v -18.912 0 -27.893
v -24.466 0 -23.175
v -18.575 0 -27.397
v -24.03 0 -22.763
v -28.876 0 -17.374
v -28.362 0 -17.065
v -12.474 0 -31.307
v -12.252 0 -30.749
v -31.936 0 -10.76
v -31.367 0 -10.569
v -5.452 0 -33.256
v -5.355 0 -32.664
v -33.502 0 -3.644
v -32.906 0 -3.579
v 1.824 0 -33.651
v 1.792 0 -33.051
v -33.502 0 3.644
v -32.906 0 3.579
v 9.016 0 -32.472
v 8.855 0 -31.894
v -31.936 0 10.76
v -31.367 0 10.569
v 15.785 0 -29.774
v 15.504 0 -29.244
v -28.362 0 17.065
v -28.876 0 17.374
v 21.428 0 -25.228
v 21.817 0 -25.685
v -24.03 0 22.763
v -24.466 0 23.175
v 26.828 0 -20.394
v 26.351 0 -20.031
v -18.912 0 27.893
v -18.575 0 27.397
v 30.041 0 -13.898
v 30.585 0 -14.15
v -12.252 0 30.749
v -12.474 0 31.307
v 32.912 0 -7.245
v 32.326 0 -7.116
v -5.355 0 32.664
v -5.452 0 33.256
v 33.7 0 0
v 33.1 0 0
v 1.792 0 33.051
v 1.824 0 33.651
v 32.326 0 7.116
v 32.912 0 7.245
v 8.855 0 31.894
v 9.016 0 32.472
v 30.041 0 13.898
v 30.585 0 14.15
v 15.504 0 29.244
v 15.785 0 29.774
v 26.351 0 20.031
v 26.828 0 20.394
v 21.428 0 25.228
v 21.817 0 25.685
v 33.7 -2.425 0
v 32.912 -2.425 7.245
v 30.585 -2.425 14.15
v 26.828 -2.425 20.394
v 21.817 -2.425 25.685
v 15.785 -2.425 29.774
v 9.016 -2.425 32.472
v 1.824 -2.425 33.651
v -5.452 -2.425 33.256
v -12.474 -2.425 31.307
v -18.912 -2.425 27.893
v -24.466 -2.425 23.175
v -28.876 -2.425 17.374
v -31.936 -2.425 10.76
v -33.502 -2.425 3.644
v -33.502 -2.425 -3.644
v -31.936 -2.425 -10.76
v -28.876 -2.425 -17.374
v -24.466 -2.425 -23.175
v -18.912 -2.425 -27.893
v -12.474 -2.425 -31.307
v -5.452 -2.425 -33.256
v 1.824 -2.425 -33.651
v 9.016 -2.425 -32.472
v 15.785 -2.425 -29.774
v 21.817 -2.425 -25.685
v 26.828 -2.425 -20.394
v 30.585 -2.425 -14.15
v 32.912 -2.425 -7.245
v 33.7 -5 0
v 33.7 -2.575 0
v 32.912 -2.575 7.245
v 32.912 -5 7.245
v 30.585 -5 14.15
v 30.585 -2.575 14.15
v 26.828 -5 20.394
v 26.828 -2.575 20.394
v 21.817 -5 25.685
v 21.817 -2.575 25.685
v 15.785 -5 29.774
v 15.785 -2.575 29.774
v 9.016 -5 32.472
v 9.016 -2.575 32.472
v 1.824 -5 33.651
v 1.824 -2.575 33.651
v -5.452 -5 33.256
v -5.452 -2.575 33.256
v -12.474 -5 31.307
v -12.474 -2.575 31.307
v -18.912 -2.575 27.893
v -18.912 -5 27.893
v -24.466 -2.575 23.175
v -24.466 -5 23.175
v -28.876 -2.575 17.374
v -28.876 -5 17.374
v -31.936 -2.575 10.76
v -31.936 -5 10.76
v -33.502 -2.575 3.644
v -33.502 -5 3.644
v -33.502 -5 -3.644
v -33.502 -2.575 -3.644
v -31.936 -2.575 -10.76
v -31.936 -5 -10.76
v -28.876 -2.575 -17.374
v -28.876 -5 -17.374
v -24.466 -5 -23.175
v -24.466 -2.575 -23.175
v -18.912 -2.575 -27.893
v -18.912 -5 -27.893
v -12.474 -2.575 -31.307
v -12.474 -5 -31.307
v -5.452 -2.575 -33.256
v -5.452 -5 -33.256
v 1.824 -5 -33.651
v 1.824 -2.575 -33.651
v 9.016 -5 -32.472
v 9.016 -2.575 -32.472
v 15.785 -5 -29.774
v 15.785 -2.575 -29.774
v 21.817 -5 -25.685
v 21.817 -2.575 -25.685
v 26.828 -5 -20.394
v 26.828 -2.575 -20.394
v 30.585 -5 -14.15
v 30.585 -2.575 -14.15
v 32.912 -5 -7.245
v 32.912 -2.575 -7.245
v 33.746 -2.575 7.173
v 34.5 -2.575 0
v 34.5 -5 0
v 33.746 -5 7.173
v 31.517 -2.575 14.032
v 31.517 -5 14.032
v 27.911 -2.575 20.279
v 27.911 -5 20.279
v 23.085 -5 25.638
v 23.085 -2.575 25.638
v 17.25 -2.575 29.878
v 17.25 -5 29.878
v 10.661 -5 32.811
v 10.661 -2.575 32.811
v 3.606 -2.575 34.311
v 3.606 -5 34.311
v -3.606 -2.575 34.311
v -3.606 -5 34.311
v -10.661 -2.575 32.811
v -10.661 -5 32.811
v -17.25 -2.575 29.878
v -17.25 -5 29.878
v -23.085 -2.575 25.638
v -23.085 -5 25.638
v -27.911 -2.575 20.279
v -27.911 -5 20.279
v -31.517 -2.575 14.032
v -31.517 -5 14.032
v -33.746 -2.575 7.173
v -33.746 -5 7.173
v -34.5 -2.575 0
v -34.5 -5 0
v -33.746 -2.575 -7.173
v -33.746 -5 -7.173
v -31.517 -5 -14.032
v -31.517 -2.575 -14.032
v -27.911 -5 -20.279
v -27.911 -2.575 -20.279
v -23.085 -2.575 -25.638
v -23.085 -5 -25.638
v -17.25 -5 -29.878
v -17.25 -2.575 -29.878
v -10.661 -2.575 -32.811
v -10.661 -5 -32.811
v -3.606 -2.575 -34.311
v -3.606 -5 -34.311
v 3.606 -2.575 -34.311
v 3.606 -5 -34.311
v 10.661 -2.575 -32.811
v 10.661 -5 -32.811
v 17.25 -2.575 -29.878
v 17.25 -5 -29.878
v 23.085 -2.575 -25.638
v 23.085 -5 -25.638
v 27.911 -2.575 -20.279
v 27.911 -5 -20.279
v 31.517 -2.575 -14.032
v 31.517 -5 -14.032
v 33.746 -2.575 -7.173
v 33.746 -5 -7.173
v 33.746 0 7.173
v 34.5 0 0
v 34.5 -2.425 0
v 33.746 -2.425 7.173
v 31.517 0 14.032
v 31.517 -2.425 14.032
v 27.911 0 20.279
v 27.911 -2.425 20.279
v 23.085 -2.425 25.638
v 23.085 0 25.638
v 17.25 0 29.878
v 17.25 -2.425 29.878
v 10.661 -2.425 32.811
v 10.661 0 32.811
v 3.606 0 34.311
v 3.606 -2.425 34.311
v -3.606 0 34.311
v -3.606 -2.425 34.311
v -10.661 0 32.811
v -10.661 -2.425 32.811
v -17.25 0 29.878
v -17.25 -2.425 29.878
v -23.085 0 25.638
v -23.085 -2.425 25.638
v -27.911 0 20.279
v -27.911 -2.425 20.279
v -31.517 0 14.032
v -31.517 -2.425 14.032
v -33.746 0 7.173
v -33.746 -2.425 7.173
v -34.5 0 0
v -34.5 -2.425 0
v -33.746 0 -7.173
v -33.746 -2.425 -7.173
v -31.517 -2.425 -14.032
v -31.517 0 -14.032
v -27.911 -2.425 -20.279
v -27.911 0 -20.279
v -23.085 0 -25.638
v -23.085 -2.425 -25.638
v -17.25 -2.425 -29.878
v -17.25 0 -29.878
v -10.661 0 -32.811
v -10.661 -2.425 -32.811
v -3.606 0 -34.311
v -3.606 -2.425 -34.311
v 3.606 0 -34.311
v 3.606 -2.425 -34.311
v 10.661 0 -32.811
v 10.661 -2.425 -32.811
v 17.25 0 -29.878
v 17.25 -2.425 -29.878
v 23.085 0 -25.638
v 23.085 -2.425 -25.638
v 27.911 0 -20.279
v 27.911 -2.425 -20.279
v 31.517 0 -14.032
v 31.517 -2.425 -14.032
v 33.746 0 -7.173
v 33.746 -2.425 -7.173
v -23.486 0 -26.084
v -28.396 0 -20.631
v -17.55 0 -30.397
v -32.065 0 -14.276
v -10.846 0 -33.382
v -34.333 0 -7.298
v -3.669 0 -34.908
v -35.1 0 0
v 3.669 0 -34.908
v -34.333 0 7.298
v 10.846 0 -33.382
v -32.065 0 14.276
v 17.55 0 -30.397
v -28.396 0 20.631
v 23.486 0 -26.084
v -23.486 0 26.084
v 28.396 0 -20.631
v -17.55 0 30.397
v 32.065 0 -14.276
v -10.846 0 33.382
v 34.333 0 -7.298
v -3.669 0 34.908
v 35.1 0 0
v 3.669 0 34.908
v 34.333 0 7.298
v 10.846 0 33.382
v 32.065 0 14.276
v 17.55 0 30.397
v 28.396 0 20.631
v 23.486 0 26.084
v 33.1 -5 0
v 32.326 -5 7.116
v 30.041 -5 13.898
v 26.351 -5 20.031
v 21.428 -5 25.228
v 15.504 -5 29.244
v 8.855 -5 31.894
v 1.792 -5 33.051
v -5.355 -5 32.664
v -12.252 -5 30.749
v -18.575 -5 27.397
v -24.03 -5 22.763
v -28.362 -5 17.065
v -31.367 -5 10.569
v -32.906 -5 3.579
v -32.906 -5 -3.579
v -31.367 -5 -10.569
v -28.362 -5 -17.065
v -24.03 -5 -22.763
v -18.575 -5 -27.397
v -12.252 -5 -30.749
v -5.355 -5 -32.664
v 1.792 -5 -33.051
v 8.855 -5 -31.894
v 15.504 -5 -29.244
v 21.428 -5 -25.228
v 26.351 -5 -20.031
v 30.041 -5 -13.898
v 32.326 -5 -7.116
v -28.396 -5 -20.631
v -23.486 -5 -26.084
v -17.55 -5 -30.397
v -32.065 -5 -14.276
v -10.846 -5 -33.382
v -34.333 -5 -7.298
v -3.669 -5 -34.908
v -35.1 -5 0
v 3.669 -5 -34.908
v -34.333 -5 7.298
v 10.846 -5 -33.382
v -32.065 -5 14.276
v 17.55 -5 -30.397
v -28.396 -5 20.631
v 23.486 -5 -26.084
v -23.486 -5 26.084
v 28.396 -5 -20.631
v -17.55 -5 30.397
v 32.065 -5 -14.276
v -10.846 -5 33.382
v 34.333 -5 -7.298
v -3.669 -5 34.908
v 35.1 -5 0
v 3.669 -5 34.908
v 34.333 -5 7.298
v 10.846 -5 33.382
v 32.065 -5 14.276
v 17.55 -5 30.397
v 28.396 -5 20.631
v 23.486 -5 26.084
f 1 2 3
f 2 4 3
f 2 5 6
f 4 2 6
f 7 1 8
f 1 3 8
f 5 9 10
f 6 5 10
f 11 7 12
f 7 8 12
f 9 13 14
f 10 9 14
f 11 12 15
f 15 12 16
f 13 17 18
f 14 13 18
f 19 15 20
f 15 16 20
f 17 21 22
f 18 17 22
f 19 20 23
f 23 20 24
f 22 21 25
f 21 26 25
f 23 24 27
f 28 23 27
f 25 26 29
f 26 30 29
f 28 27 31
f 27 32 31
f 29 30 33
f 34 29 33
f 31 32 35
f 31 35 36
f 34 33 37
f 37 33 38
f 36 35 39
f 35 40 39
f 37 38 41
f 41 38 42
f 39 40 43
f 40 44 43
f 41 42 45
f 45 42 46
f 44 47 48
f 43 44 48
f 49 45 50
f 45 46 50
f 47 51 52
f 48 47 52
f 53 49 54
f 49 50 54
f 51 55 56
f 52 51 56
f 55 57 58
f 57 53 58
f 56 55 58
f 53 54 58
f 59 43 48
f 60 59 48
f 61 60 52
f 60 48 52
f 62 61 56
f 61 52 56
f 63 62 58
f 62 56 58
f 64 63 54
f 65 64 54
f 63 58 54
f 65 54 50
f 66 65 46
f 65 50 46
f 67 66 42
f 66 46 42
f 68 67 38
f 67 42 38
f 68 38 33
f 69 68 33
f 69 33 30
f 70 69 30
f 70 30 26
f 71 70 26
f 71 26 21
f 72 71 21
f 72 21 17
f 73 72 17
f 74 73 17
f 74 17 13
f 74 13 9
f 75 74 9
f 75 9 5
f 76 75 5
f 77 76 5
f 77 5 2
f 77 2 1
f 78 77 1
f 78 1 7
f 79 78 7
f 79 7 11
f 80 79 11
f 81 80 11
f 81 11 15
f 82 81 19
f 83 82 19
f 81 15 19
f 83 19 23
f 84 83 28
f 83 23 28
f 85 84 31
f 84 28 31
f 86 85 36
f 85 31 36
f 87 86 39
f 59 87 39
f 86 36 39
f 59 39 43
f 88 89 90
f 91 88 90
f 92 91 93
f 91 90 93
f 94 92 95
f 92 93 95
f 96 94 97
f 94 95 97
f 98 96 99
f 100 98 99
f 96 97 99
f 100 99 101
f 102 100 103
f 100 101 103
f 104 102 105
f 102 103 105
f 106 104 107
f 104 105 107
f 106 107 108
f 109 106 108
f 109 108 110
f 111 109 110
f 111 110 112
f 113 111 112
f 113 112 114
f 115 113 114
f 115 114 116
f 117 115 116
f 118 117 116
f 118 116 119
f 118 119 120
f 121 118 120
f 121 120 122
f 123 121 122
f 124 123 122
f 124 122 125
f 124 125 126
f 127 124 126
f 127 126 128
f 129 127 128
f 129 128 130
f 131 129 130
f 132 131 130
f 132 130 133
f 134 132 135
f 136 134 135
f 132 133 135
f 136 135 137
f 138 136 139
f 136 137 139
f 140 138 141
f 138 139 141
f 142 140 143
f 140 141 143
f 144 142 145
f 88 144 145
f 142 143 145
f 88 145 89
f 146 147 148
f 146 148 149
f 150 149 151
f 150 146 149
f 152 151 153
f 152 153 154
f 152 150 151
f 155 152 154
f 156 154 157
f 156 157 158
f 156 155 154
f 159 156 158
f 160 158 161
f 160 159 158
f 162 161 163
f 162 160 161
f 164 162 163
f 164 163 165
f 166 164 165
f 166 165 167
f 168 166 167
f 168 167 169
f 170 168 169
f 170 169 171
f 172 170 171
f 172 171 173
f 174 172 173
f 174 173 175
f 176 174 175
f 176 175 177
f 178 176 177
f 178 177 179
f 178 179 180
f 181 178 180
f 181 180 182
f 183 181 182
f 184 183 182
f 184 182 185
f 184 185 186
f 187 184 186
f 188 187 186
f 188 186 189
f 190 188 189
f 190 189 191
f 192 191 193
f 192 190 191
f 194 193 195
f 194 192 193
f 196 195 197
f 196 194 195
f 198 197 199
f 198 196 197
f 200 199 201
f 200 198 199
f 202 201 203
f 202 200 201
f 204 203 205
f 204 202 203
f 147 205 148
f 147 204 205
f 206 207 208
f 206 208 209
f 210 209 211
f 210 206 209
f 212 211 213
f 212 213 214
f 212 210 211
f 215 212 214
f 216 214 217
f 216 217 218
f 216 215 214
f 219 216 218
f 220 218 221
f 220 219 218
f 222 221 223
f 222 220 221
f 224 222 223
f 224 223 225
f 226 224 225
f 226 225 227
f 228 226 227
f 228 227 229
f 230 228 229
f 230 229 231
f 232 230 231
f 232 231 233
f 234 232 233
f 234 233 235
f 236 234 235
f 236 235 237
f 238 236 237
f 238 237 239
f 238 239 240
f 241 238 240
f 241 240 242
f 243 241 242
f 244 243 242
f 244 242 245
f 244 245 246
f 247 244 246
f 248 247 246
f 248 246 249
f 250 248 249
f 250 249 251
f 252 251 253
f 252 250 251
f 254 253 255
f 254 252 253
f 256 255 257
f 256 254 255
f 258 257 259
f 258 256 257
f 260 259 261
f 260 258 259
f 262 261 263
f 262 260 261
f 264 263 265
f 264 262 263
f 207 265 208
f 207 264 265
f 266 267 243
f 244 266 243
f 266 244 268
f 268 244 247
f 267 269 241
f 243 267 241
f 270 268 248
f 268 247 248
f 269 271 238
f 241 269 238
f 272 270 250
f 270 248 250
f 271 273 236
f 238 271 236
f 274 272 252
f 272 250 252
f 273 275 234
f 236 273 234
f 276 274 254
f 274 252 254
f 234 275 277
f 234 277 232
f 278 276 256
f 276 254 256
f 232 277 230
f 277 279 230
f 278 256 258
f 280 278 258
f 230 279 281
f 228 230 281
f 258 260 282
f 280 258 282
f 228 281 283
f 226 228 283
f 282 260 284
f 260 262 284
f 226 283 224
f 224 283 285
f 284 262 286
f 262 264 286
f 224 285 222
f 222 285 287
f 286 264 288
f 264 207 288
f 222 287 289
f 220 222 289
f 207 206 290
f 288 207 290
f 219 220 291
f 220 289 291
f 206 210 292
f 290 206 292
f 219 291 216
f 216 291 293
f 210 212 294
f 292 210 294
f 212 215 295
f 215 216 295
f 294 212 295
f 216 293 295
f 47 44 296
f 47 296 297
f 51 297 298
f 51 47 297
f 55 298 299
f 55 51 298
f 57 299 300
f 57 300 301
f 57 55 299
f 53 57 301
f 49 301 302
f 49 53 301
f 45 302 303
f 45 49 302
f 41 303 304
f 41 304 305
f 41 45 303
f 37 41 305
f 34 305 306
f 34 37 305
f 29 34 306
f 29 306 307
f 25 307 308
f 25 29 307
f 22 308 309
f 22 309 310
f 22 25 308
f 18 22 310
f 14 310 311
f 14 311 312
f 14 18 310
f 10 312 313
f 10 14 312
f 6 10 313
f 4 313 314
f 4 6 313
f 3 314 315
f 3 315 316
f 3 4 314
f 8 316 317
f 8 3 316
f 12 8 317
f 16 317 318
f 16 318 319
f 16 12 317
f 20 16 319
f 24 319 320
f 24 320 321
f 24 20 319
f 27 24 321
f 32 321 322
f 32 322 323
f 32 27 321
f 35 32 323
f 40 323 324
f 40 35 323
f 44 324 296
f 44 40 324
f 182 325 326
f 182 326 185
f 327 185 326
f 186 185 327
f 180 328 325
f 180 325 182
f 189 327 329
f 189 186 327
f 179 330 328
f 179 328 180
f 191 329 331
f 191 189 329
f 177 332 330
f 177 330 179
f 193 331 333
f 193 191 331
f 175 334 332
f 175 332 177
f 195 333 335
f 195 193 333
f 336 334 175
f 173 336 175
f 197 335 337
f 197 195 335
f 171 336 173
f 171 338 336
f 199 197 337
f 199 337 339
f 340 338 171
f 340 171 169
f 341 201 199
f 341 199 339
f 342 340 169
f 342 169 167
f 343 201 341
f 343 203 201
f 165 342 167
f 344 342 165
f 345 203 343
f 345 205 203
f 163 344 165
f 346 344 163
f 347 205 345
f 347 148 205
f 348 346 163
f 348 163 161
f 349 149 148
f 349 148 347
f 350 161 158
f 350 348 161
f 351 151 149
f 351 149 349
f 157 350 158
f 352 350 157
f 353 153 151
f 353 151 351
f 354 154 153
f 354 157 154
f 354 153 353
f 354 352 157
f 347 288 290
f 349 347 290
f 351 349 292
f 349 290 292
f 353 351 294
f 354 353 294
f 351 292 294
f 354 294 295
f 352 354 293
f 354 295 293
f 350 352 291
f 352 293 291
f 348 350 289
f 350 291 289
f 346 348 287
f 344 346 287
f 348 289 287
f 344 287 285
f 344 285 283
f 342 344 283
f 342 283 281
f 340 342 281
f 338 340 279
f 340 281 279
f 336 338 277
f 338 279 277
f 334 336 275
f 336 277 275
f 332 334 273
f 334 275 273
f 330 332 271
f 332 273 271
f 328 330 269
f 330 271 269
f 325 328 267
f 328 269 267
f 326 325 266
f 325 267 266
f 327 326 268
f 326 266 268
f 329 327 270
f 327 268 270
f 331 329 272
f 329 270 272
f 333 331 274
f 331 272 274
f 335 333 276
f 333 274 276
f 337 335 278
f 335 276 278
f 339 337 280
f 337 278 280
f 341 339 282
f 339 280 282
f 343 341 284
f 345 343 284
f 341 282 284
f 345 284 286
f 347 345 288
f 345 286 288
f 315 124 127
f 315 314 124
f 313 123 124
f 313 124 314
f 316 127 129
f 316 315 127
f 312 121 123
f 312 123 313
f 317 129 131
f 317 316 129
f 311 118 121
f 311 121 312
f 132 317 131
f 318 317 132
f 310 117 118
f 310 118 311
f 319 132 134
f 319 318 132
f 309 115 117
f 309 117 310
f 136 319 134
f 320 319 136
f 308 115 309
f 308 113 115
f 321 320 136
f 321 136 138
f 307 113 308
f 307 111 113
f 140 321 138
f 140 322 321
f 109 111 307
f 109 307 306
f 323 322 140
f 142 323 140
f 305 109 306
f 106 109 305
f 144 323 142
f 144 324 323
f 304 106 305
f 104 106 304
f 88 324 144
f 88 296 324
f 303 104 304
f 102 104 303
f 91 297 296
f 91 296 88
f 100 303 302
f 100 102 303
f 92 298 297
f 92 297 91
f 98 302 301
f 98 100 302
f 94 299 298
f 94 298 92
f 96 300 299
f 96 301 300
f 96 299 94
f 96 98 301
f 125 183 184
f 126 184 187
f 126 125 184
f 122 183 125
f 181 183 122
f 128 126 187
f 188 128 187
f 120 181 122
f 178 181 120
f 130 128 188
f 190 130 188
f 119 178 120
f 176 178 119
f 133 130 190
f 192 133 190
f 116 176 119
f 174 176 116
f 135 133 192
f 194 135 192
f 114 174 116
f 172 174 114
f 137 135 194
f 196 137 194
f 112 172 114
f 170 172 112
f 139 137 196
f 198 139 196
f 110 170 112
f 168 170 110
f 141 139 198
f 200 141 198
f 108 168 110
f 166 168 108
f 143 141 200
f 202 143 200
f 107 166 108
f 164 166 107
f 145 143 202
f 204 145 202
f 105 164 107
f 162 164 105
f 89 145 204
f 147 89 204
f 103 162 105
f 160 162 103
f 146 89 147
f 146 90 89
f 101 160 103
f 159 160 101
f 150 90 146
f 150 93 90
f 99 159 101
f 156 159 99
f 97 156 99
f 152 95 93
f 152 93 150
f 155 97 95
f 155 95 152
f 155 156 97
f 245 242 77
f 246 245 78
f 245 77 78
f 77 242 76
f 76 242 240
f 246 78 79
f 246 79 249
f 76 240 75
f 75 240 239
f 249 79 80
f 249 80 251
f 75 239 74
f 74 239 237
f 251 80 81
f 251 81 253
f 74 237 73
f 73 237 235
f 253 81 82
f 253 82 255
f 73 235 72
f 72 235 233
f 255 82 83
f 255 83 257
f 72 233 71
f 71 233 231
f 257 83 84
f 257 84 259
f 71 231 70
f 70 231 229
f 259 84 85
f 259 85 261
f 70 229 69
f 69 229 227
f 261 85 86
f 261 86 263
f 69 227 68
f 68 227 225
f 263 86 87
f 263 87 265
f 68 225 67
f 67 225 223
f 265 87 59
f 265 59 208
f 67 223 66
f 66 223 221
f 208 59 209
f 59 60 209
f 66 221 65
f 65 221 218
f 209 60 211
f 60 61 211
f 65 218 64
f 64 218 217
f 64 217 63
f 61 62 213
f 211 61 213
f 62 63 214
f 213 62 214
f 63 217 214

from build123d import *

# Parameters (mm, degrees)
F0_R     = 35.1
F0_R_2   = 34.5
F1_DEPTH = 5
F0_R_3   = 33.6999967694
F0_R_4   = 33.0999977887
F3_R     = 34.5
F3_R_2   = 33.6999967694
F4_DEPTH = 0.075


with BuildPart() as f1:
    # F0 (on Front) → F1 (new body)
    with BuildSketch(Plane.XZ):
        Circle(F0_R)
        Circle(F0_R_2, mode=Mode.SUBTRACT)
    extrude(amount=F1_DEPTH)



with BuildPart() as f1b:
    # F0 (on Front) → F1, piece 2 (new body)
    with BuildSketch(Plane.XZ):
        Circle(F0_R_3)
        Circle(F0_R_4, mode=Mode.SUBTRACT)
    extrude(amount=F1_DEPTH)


with BuildPart() as f1_1:
    add(f1.part)

    add(f1b.part)  # F4 merges F1b
    # F3 (on offset) → F4 (join, symmetric)
    with BuildSketch(Plane.XZ.offset(2.5)):
        Circle(F3_R)
        Circle(F3_R_2, mode=Mode.SUBTRACT)
    extrude(amount=F4_DEPTH, both=True)


solid = f1_1.part
